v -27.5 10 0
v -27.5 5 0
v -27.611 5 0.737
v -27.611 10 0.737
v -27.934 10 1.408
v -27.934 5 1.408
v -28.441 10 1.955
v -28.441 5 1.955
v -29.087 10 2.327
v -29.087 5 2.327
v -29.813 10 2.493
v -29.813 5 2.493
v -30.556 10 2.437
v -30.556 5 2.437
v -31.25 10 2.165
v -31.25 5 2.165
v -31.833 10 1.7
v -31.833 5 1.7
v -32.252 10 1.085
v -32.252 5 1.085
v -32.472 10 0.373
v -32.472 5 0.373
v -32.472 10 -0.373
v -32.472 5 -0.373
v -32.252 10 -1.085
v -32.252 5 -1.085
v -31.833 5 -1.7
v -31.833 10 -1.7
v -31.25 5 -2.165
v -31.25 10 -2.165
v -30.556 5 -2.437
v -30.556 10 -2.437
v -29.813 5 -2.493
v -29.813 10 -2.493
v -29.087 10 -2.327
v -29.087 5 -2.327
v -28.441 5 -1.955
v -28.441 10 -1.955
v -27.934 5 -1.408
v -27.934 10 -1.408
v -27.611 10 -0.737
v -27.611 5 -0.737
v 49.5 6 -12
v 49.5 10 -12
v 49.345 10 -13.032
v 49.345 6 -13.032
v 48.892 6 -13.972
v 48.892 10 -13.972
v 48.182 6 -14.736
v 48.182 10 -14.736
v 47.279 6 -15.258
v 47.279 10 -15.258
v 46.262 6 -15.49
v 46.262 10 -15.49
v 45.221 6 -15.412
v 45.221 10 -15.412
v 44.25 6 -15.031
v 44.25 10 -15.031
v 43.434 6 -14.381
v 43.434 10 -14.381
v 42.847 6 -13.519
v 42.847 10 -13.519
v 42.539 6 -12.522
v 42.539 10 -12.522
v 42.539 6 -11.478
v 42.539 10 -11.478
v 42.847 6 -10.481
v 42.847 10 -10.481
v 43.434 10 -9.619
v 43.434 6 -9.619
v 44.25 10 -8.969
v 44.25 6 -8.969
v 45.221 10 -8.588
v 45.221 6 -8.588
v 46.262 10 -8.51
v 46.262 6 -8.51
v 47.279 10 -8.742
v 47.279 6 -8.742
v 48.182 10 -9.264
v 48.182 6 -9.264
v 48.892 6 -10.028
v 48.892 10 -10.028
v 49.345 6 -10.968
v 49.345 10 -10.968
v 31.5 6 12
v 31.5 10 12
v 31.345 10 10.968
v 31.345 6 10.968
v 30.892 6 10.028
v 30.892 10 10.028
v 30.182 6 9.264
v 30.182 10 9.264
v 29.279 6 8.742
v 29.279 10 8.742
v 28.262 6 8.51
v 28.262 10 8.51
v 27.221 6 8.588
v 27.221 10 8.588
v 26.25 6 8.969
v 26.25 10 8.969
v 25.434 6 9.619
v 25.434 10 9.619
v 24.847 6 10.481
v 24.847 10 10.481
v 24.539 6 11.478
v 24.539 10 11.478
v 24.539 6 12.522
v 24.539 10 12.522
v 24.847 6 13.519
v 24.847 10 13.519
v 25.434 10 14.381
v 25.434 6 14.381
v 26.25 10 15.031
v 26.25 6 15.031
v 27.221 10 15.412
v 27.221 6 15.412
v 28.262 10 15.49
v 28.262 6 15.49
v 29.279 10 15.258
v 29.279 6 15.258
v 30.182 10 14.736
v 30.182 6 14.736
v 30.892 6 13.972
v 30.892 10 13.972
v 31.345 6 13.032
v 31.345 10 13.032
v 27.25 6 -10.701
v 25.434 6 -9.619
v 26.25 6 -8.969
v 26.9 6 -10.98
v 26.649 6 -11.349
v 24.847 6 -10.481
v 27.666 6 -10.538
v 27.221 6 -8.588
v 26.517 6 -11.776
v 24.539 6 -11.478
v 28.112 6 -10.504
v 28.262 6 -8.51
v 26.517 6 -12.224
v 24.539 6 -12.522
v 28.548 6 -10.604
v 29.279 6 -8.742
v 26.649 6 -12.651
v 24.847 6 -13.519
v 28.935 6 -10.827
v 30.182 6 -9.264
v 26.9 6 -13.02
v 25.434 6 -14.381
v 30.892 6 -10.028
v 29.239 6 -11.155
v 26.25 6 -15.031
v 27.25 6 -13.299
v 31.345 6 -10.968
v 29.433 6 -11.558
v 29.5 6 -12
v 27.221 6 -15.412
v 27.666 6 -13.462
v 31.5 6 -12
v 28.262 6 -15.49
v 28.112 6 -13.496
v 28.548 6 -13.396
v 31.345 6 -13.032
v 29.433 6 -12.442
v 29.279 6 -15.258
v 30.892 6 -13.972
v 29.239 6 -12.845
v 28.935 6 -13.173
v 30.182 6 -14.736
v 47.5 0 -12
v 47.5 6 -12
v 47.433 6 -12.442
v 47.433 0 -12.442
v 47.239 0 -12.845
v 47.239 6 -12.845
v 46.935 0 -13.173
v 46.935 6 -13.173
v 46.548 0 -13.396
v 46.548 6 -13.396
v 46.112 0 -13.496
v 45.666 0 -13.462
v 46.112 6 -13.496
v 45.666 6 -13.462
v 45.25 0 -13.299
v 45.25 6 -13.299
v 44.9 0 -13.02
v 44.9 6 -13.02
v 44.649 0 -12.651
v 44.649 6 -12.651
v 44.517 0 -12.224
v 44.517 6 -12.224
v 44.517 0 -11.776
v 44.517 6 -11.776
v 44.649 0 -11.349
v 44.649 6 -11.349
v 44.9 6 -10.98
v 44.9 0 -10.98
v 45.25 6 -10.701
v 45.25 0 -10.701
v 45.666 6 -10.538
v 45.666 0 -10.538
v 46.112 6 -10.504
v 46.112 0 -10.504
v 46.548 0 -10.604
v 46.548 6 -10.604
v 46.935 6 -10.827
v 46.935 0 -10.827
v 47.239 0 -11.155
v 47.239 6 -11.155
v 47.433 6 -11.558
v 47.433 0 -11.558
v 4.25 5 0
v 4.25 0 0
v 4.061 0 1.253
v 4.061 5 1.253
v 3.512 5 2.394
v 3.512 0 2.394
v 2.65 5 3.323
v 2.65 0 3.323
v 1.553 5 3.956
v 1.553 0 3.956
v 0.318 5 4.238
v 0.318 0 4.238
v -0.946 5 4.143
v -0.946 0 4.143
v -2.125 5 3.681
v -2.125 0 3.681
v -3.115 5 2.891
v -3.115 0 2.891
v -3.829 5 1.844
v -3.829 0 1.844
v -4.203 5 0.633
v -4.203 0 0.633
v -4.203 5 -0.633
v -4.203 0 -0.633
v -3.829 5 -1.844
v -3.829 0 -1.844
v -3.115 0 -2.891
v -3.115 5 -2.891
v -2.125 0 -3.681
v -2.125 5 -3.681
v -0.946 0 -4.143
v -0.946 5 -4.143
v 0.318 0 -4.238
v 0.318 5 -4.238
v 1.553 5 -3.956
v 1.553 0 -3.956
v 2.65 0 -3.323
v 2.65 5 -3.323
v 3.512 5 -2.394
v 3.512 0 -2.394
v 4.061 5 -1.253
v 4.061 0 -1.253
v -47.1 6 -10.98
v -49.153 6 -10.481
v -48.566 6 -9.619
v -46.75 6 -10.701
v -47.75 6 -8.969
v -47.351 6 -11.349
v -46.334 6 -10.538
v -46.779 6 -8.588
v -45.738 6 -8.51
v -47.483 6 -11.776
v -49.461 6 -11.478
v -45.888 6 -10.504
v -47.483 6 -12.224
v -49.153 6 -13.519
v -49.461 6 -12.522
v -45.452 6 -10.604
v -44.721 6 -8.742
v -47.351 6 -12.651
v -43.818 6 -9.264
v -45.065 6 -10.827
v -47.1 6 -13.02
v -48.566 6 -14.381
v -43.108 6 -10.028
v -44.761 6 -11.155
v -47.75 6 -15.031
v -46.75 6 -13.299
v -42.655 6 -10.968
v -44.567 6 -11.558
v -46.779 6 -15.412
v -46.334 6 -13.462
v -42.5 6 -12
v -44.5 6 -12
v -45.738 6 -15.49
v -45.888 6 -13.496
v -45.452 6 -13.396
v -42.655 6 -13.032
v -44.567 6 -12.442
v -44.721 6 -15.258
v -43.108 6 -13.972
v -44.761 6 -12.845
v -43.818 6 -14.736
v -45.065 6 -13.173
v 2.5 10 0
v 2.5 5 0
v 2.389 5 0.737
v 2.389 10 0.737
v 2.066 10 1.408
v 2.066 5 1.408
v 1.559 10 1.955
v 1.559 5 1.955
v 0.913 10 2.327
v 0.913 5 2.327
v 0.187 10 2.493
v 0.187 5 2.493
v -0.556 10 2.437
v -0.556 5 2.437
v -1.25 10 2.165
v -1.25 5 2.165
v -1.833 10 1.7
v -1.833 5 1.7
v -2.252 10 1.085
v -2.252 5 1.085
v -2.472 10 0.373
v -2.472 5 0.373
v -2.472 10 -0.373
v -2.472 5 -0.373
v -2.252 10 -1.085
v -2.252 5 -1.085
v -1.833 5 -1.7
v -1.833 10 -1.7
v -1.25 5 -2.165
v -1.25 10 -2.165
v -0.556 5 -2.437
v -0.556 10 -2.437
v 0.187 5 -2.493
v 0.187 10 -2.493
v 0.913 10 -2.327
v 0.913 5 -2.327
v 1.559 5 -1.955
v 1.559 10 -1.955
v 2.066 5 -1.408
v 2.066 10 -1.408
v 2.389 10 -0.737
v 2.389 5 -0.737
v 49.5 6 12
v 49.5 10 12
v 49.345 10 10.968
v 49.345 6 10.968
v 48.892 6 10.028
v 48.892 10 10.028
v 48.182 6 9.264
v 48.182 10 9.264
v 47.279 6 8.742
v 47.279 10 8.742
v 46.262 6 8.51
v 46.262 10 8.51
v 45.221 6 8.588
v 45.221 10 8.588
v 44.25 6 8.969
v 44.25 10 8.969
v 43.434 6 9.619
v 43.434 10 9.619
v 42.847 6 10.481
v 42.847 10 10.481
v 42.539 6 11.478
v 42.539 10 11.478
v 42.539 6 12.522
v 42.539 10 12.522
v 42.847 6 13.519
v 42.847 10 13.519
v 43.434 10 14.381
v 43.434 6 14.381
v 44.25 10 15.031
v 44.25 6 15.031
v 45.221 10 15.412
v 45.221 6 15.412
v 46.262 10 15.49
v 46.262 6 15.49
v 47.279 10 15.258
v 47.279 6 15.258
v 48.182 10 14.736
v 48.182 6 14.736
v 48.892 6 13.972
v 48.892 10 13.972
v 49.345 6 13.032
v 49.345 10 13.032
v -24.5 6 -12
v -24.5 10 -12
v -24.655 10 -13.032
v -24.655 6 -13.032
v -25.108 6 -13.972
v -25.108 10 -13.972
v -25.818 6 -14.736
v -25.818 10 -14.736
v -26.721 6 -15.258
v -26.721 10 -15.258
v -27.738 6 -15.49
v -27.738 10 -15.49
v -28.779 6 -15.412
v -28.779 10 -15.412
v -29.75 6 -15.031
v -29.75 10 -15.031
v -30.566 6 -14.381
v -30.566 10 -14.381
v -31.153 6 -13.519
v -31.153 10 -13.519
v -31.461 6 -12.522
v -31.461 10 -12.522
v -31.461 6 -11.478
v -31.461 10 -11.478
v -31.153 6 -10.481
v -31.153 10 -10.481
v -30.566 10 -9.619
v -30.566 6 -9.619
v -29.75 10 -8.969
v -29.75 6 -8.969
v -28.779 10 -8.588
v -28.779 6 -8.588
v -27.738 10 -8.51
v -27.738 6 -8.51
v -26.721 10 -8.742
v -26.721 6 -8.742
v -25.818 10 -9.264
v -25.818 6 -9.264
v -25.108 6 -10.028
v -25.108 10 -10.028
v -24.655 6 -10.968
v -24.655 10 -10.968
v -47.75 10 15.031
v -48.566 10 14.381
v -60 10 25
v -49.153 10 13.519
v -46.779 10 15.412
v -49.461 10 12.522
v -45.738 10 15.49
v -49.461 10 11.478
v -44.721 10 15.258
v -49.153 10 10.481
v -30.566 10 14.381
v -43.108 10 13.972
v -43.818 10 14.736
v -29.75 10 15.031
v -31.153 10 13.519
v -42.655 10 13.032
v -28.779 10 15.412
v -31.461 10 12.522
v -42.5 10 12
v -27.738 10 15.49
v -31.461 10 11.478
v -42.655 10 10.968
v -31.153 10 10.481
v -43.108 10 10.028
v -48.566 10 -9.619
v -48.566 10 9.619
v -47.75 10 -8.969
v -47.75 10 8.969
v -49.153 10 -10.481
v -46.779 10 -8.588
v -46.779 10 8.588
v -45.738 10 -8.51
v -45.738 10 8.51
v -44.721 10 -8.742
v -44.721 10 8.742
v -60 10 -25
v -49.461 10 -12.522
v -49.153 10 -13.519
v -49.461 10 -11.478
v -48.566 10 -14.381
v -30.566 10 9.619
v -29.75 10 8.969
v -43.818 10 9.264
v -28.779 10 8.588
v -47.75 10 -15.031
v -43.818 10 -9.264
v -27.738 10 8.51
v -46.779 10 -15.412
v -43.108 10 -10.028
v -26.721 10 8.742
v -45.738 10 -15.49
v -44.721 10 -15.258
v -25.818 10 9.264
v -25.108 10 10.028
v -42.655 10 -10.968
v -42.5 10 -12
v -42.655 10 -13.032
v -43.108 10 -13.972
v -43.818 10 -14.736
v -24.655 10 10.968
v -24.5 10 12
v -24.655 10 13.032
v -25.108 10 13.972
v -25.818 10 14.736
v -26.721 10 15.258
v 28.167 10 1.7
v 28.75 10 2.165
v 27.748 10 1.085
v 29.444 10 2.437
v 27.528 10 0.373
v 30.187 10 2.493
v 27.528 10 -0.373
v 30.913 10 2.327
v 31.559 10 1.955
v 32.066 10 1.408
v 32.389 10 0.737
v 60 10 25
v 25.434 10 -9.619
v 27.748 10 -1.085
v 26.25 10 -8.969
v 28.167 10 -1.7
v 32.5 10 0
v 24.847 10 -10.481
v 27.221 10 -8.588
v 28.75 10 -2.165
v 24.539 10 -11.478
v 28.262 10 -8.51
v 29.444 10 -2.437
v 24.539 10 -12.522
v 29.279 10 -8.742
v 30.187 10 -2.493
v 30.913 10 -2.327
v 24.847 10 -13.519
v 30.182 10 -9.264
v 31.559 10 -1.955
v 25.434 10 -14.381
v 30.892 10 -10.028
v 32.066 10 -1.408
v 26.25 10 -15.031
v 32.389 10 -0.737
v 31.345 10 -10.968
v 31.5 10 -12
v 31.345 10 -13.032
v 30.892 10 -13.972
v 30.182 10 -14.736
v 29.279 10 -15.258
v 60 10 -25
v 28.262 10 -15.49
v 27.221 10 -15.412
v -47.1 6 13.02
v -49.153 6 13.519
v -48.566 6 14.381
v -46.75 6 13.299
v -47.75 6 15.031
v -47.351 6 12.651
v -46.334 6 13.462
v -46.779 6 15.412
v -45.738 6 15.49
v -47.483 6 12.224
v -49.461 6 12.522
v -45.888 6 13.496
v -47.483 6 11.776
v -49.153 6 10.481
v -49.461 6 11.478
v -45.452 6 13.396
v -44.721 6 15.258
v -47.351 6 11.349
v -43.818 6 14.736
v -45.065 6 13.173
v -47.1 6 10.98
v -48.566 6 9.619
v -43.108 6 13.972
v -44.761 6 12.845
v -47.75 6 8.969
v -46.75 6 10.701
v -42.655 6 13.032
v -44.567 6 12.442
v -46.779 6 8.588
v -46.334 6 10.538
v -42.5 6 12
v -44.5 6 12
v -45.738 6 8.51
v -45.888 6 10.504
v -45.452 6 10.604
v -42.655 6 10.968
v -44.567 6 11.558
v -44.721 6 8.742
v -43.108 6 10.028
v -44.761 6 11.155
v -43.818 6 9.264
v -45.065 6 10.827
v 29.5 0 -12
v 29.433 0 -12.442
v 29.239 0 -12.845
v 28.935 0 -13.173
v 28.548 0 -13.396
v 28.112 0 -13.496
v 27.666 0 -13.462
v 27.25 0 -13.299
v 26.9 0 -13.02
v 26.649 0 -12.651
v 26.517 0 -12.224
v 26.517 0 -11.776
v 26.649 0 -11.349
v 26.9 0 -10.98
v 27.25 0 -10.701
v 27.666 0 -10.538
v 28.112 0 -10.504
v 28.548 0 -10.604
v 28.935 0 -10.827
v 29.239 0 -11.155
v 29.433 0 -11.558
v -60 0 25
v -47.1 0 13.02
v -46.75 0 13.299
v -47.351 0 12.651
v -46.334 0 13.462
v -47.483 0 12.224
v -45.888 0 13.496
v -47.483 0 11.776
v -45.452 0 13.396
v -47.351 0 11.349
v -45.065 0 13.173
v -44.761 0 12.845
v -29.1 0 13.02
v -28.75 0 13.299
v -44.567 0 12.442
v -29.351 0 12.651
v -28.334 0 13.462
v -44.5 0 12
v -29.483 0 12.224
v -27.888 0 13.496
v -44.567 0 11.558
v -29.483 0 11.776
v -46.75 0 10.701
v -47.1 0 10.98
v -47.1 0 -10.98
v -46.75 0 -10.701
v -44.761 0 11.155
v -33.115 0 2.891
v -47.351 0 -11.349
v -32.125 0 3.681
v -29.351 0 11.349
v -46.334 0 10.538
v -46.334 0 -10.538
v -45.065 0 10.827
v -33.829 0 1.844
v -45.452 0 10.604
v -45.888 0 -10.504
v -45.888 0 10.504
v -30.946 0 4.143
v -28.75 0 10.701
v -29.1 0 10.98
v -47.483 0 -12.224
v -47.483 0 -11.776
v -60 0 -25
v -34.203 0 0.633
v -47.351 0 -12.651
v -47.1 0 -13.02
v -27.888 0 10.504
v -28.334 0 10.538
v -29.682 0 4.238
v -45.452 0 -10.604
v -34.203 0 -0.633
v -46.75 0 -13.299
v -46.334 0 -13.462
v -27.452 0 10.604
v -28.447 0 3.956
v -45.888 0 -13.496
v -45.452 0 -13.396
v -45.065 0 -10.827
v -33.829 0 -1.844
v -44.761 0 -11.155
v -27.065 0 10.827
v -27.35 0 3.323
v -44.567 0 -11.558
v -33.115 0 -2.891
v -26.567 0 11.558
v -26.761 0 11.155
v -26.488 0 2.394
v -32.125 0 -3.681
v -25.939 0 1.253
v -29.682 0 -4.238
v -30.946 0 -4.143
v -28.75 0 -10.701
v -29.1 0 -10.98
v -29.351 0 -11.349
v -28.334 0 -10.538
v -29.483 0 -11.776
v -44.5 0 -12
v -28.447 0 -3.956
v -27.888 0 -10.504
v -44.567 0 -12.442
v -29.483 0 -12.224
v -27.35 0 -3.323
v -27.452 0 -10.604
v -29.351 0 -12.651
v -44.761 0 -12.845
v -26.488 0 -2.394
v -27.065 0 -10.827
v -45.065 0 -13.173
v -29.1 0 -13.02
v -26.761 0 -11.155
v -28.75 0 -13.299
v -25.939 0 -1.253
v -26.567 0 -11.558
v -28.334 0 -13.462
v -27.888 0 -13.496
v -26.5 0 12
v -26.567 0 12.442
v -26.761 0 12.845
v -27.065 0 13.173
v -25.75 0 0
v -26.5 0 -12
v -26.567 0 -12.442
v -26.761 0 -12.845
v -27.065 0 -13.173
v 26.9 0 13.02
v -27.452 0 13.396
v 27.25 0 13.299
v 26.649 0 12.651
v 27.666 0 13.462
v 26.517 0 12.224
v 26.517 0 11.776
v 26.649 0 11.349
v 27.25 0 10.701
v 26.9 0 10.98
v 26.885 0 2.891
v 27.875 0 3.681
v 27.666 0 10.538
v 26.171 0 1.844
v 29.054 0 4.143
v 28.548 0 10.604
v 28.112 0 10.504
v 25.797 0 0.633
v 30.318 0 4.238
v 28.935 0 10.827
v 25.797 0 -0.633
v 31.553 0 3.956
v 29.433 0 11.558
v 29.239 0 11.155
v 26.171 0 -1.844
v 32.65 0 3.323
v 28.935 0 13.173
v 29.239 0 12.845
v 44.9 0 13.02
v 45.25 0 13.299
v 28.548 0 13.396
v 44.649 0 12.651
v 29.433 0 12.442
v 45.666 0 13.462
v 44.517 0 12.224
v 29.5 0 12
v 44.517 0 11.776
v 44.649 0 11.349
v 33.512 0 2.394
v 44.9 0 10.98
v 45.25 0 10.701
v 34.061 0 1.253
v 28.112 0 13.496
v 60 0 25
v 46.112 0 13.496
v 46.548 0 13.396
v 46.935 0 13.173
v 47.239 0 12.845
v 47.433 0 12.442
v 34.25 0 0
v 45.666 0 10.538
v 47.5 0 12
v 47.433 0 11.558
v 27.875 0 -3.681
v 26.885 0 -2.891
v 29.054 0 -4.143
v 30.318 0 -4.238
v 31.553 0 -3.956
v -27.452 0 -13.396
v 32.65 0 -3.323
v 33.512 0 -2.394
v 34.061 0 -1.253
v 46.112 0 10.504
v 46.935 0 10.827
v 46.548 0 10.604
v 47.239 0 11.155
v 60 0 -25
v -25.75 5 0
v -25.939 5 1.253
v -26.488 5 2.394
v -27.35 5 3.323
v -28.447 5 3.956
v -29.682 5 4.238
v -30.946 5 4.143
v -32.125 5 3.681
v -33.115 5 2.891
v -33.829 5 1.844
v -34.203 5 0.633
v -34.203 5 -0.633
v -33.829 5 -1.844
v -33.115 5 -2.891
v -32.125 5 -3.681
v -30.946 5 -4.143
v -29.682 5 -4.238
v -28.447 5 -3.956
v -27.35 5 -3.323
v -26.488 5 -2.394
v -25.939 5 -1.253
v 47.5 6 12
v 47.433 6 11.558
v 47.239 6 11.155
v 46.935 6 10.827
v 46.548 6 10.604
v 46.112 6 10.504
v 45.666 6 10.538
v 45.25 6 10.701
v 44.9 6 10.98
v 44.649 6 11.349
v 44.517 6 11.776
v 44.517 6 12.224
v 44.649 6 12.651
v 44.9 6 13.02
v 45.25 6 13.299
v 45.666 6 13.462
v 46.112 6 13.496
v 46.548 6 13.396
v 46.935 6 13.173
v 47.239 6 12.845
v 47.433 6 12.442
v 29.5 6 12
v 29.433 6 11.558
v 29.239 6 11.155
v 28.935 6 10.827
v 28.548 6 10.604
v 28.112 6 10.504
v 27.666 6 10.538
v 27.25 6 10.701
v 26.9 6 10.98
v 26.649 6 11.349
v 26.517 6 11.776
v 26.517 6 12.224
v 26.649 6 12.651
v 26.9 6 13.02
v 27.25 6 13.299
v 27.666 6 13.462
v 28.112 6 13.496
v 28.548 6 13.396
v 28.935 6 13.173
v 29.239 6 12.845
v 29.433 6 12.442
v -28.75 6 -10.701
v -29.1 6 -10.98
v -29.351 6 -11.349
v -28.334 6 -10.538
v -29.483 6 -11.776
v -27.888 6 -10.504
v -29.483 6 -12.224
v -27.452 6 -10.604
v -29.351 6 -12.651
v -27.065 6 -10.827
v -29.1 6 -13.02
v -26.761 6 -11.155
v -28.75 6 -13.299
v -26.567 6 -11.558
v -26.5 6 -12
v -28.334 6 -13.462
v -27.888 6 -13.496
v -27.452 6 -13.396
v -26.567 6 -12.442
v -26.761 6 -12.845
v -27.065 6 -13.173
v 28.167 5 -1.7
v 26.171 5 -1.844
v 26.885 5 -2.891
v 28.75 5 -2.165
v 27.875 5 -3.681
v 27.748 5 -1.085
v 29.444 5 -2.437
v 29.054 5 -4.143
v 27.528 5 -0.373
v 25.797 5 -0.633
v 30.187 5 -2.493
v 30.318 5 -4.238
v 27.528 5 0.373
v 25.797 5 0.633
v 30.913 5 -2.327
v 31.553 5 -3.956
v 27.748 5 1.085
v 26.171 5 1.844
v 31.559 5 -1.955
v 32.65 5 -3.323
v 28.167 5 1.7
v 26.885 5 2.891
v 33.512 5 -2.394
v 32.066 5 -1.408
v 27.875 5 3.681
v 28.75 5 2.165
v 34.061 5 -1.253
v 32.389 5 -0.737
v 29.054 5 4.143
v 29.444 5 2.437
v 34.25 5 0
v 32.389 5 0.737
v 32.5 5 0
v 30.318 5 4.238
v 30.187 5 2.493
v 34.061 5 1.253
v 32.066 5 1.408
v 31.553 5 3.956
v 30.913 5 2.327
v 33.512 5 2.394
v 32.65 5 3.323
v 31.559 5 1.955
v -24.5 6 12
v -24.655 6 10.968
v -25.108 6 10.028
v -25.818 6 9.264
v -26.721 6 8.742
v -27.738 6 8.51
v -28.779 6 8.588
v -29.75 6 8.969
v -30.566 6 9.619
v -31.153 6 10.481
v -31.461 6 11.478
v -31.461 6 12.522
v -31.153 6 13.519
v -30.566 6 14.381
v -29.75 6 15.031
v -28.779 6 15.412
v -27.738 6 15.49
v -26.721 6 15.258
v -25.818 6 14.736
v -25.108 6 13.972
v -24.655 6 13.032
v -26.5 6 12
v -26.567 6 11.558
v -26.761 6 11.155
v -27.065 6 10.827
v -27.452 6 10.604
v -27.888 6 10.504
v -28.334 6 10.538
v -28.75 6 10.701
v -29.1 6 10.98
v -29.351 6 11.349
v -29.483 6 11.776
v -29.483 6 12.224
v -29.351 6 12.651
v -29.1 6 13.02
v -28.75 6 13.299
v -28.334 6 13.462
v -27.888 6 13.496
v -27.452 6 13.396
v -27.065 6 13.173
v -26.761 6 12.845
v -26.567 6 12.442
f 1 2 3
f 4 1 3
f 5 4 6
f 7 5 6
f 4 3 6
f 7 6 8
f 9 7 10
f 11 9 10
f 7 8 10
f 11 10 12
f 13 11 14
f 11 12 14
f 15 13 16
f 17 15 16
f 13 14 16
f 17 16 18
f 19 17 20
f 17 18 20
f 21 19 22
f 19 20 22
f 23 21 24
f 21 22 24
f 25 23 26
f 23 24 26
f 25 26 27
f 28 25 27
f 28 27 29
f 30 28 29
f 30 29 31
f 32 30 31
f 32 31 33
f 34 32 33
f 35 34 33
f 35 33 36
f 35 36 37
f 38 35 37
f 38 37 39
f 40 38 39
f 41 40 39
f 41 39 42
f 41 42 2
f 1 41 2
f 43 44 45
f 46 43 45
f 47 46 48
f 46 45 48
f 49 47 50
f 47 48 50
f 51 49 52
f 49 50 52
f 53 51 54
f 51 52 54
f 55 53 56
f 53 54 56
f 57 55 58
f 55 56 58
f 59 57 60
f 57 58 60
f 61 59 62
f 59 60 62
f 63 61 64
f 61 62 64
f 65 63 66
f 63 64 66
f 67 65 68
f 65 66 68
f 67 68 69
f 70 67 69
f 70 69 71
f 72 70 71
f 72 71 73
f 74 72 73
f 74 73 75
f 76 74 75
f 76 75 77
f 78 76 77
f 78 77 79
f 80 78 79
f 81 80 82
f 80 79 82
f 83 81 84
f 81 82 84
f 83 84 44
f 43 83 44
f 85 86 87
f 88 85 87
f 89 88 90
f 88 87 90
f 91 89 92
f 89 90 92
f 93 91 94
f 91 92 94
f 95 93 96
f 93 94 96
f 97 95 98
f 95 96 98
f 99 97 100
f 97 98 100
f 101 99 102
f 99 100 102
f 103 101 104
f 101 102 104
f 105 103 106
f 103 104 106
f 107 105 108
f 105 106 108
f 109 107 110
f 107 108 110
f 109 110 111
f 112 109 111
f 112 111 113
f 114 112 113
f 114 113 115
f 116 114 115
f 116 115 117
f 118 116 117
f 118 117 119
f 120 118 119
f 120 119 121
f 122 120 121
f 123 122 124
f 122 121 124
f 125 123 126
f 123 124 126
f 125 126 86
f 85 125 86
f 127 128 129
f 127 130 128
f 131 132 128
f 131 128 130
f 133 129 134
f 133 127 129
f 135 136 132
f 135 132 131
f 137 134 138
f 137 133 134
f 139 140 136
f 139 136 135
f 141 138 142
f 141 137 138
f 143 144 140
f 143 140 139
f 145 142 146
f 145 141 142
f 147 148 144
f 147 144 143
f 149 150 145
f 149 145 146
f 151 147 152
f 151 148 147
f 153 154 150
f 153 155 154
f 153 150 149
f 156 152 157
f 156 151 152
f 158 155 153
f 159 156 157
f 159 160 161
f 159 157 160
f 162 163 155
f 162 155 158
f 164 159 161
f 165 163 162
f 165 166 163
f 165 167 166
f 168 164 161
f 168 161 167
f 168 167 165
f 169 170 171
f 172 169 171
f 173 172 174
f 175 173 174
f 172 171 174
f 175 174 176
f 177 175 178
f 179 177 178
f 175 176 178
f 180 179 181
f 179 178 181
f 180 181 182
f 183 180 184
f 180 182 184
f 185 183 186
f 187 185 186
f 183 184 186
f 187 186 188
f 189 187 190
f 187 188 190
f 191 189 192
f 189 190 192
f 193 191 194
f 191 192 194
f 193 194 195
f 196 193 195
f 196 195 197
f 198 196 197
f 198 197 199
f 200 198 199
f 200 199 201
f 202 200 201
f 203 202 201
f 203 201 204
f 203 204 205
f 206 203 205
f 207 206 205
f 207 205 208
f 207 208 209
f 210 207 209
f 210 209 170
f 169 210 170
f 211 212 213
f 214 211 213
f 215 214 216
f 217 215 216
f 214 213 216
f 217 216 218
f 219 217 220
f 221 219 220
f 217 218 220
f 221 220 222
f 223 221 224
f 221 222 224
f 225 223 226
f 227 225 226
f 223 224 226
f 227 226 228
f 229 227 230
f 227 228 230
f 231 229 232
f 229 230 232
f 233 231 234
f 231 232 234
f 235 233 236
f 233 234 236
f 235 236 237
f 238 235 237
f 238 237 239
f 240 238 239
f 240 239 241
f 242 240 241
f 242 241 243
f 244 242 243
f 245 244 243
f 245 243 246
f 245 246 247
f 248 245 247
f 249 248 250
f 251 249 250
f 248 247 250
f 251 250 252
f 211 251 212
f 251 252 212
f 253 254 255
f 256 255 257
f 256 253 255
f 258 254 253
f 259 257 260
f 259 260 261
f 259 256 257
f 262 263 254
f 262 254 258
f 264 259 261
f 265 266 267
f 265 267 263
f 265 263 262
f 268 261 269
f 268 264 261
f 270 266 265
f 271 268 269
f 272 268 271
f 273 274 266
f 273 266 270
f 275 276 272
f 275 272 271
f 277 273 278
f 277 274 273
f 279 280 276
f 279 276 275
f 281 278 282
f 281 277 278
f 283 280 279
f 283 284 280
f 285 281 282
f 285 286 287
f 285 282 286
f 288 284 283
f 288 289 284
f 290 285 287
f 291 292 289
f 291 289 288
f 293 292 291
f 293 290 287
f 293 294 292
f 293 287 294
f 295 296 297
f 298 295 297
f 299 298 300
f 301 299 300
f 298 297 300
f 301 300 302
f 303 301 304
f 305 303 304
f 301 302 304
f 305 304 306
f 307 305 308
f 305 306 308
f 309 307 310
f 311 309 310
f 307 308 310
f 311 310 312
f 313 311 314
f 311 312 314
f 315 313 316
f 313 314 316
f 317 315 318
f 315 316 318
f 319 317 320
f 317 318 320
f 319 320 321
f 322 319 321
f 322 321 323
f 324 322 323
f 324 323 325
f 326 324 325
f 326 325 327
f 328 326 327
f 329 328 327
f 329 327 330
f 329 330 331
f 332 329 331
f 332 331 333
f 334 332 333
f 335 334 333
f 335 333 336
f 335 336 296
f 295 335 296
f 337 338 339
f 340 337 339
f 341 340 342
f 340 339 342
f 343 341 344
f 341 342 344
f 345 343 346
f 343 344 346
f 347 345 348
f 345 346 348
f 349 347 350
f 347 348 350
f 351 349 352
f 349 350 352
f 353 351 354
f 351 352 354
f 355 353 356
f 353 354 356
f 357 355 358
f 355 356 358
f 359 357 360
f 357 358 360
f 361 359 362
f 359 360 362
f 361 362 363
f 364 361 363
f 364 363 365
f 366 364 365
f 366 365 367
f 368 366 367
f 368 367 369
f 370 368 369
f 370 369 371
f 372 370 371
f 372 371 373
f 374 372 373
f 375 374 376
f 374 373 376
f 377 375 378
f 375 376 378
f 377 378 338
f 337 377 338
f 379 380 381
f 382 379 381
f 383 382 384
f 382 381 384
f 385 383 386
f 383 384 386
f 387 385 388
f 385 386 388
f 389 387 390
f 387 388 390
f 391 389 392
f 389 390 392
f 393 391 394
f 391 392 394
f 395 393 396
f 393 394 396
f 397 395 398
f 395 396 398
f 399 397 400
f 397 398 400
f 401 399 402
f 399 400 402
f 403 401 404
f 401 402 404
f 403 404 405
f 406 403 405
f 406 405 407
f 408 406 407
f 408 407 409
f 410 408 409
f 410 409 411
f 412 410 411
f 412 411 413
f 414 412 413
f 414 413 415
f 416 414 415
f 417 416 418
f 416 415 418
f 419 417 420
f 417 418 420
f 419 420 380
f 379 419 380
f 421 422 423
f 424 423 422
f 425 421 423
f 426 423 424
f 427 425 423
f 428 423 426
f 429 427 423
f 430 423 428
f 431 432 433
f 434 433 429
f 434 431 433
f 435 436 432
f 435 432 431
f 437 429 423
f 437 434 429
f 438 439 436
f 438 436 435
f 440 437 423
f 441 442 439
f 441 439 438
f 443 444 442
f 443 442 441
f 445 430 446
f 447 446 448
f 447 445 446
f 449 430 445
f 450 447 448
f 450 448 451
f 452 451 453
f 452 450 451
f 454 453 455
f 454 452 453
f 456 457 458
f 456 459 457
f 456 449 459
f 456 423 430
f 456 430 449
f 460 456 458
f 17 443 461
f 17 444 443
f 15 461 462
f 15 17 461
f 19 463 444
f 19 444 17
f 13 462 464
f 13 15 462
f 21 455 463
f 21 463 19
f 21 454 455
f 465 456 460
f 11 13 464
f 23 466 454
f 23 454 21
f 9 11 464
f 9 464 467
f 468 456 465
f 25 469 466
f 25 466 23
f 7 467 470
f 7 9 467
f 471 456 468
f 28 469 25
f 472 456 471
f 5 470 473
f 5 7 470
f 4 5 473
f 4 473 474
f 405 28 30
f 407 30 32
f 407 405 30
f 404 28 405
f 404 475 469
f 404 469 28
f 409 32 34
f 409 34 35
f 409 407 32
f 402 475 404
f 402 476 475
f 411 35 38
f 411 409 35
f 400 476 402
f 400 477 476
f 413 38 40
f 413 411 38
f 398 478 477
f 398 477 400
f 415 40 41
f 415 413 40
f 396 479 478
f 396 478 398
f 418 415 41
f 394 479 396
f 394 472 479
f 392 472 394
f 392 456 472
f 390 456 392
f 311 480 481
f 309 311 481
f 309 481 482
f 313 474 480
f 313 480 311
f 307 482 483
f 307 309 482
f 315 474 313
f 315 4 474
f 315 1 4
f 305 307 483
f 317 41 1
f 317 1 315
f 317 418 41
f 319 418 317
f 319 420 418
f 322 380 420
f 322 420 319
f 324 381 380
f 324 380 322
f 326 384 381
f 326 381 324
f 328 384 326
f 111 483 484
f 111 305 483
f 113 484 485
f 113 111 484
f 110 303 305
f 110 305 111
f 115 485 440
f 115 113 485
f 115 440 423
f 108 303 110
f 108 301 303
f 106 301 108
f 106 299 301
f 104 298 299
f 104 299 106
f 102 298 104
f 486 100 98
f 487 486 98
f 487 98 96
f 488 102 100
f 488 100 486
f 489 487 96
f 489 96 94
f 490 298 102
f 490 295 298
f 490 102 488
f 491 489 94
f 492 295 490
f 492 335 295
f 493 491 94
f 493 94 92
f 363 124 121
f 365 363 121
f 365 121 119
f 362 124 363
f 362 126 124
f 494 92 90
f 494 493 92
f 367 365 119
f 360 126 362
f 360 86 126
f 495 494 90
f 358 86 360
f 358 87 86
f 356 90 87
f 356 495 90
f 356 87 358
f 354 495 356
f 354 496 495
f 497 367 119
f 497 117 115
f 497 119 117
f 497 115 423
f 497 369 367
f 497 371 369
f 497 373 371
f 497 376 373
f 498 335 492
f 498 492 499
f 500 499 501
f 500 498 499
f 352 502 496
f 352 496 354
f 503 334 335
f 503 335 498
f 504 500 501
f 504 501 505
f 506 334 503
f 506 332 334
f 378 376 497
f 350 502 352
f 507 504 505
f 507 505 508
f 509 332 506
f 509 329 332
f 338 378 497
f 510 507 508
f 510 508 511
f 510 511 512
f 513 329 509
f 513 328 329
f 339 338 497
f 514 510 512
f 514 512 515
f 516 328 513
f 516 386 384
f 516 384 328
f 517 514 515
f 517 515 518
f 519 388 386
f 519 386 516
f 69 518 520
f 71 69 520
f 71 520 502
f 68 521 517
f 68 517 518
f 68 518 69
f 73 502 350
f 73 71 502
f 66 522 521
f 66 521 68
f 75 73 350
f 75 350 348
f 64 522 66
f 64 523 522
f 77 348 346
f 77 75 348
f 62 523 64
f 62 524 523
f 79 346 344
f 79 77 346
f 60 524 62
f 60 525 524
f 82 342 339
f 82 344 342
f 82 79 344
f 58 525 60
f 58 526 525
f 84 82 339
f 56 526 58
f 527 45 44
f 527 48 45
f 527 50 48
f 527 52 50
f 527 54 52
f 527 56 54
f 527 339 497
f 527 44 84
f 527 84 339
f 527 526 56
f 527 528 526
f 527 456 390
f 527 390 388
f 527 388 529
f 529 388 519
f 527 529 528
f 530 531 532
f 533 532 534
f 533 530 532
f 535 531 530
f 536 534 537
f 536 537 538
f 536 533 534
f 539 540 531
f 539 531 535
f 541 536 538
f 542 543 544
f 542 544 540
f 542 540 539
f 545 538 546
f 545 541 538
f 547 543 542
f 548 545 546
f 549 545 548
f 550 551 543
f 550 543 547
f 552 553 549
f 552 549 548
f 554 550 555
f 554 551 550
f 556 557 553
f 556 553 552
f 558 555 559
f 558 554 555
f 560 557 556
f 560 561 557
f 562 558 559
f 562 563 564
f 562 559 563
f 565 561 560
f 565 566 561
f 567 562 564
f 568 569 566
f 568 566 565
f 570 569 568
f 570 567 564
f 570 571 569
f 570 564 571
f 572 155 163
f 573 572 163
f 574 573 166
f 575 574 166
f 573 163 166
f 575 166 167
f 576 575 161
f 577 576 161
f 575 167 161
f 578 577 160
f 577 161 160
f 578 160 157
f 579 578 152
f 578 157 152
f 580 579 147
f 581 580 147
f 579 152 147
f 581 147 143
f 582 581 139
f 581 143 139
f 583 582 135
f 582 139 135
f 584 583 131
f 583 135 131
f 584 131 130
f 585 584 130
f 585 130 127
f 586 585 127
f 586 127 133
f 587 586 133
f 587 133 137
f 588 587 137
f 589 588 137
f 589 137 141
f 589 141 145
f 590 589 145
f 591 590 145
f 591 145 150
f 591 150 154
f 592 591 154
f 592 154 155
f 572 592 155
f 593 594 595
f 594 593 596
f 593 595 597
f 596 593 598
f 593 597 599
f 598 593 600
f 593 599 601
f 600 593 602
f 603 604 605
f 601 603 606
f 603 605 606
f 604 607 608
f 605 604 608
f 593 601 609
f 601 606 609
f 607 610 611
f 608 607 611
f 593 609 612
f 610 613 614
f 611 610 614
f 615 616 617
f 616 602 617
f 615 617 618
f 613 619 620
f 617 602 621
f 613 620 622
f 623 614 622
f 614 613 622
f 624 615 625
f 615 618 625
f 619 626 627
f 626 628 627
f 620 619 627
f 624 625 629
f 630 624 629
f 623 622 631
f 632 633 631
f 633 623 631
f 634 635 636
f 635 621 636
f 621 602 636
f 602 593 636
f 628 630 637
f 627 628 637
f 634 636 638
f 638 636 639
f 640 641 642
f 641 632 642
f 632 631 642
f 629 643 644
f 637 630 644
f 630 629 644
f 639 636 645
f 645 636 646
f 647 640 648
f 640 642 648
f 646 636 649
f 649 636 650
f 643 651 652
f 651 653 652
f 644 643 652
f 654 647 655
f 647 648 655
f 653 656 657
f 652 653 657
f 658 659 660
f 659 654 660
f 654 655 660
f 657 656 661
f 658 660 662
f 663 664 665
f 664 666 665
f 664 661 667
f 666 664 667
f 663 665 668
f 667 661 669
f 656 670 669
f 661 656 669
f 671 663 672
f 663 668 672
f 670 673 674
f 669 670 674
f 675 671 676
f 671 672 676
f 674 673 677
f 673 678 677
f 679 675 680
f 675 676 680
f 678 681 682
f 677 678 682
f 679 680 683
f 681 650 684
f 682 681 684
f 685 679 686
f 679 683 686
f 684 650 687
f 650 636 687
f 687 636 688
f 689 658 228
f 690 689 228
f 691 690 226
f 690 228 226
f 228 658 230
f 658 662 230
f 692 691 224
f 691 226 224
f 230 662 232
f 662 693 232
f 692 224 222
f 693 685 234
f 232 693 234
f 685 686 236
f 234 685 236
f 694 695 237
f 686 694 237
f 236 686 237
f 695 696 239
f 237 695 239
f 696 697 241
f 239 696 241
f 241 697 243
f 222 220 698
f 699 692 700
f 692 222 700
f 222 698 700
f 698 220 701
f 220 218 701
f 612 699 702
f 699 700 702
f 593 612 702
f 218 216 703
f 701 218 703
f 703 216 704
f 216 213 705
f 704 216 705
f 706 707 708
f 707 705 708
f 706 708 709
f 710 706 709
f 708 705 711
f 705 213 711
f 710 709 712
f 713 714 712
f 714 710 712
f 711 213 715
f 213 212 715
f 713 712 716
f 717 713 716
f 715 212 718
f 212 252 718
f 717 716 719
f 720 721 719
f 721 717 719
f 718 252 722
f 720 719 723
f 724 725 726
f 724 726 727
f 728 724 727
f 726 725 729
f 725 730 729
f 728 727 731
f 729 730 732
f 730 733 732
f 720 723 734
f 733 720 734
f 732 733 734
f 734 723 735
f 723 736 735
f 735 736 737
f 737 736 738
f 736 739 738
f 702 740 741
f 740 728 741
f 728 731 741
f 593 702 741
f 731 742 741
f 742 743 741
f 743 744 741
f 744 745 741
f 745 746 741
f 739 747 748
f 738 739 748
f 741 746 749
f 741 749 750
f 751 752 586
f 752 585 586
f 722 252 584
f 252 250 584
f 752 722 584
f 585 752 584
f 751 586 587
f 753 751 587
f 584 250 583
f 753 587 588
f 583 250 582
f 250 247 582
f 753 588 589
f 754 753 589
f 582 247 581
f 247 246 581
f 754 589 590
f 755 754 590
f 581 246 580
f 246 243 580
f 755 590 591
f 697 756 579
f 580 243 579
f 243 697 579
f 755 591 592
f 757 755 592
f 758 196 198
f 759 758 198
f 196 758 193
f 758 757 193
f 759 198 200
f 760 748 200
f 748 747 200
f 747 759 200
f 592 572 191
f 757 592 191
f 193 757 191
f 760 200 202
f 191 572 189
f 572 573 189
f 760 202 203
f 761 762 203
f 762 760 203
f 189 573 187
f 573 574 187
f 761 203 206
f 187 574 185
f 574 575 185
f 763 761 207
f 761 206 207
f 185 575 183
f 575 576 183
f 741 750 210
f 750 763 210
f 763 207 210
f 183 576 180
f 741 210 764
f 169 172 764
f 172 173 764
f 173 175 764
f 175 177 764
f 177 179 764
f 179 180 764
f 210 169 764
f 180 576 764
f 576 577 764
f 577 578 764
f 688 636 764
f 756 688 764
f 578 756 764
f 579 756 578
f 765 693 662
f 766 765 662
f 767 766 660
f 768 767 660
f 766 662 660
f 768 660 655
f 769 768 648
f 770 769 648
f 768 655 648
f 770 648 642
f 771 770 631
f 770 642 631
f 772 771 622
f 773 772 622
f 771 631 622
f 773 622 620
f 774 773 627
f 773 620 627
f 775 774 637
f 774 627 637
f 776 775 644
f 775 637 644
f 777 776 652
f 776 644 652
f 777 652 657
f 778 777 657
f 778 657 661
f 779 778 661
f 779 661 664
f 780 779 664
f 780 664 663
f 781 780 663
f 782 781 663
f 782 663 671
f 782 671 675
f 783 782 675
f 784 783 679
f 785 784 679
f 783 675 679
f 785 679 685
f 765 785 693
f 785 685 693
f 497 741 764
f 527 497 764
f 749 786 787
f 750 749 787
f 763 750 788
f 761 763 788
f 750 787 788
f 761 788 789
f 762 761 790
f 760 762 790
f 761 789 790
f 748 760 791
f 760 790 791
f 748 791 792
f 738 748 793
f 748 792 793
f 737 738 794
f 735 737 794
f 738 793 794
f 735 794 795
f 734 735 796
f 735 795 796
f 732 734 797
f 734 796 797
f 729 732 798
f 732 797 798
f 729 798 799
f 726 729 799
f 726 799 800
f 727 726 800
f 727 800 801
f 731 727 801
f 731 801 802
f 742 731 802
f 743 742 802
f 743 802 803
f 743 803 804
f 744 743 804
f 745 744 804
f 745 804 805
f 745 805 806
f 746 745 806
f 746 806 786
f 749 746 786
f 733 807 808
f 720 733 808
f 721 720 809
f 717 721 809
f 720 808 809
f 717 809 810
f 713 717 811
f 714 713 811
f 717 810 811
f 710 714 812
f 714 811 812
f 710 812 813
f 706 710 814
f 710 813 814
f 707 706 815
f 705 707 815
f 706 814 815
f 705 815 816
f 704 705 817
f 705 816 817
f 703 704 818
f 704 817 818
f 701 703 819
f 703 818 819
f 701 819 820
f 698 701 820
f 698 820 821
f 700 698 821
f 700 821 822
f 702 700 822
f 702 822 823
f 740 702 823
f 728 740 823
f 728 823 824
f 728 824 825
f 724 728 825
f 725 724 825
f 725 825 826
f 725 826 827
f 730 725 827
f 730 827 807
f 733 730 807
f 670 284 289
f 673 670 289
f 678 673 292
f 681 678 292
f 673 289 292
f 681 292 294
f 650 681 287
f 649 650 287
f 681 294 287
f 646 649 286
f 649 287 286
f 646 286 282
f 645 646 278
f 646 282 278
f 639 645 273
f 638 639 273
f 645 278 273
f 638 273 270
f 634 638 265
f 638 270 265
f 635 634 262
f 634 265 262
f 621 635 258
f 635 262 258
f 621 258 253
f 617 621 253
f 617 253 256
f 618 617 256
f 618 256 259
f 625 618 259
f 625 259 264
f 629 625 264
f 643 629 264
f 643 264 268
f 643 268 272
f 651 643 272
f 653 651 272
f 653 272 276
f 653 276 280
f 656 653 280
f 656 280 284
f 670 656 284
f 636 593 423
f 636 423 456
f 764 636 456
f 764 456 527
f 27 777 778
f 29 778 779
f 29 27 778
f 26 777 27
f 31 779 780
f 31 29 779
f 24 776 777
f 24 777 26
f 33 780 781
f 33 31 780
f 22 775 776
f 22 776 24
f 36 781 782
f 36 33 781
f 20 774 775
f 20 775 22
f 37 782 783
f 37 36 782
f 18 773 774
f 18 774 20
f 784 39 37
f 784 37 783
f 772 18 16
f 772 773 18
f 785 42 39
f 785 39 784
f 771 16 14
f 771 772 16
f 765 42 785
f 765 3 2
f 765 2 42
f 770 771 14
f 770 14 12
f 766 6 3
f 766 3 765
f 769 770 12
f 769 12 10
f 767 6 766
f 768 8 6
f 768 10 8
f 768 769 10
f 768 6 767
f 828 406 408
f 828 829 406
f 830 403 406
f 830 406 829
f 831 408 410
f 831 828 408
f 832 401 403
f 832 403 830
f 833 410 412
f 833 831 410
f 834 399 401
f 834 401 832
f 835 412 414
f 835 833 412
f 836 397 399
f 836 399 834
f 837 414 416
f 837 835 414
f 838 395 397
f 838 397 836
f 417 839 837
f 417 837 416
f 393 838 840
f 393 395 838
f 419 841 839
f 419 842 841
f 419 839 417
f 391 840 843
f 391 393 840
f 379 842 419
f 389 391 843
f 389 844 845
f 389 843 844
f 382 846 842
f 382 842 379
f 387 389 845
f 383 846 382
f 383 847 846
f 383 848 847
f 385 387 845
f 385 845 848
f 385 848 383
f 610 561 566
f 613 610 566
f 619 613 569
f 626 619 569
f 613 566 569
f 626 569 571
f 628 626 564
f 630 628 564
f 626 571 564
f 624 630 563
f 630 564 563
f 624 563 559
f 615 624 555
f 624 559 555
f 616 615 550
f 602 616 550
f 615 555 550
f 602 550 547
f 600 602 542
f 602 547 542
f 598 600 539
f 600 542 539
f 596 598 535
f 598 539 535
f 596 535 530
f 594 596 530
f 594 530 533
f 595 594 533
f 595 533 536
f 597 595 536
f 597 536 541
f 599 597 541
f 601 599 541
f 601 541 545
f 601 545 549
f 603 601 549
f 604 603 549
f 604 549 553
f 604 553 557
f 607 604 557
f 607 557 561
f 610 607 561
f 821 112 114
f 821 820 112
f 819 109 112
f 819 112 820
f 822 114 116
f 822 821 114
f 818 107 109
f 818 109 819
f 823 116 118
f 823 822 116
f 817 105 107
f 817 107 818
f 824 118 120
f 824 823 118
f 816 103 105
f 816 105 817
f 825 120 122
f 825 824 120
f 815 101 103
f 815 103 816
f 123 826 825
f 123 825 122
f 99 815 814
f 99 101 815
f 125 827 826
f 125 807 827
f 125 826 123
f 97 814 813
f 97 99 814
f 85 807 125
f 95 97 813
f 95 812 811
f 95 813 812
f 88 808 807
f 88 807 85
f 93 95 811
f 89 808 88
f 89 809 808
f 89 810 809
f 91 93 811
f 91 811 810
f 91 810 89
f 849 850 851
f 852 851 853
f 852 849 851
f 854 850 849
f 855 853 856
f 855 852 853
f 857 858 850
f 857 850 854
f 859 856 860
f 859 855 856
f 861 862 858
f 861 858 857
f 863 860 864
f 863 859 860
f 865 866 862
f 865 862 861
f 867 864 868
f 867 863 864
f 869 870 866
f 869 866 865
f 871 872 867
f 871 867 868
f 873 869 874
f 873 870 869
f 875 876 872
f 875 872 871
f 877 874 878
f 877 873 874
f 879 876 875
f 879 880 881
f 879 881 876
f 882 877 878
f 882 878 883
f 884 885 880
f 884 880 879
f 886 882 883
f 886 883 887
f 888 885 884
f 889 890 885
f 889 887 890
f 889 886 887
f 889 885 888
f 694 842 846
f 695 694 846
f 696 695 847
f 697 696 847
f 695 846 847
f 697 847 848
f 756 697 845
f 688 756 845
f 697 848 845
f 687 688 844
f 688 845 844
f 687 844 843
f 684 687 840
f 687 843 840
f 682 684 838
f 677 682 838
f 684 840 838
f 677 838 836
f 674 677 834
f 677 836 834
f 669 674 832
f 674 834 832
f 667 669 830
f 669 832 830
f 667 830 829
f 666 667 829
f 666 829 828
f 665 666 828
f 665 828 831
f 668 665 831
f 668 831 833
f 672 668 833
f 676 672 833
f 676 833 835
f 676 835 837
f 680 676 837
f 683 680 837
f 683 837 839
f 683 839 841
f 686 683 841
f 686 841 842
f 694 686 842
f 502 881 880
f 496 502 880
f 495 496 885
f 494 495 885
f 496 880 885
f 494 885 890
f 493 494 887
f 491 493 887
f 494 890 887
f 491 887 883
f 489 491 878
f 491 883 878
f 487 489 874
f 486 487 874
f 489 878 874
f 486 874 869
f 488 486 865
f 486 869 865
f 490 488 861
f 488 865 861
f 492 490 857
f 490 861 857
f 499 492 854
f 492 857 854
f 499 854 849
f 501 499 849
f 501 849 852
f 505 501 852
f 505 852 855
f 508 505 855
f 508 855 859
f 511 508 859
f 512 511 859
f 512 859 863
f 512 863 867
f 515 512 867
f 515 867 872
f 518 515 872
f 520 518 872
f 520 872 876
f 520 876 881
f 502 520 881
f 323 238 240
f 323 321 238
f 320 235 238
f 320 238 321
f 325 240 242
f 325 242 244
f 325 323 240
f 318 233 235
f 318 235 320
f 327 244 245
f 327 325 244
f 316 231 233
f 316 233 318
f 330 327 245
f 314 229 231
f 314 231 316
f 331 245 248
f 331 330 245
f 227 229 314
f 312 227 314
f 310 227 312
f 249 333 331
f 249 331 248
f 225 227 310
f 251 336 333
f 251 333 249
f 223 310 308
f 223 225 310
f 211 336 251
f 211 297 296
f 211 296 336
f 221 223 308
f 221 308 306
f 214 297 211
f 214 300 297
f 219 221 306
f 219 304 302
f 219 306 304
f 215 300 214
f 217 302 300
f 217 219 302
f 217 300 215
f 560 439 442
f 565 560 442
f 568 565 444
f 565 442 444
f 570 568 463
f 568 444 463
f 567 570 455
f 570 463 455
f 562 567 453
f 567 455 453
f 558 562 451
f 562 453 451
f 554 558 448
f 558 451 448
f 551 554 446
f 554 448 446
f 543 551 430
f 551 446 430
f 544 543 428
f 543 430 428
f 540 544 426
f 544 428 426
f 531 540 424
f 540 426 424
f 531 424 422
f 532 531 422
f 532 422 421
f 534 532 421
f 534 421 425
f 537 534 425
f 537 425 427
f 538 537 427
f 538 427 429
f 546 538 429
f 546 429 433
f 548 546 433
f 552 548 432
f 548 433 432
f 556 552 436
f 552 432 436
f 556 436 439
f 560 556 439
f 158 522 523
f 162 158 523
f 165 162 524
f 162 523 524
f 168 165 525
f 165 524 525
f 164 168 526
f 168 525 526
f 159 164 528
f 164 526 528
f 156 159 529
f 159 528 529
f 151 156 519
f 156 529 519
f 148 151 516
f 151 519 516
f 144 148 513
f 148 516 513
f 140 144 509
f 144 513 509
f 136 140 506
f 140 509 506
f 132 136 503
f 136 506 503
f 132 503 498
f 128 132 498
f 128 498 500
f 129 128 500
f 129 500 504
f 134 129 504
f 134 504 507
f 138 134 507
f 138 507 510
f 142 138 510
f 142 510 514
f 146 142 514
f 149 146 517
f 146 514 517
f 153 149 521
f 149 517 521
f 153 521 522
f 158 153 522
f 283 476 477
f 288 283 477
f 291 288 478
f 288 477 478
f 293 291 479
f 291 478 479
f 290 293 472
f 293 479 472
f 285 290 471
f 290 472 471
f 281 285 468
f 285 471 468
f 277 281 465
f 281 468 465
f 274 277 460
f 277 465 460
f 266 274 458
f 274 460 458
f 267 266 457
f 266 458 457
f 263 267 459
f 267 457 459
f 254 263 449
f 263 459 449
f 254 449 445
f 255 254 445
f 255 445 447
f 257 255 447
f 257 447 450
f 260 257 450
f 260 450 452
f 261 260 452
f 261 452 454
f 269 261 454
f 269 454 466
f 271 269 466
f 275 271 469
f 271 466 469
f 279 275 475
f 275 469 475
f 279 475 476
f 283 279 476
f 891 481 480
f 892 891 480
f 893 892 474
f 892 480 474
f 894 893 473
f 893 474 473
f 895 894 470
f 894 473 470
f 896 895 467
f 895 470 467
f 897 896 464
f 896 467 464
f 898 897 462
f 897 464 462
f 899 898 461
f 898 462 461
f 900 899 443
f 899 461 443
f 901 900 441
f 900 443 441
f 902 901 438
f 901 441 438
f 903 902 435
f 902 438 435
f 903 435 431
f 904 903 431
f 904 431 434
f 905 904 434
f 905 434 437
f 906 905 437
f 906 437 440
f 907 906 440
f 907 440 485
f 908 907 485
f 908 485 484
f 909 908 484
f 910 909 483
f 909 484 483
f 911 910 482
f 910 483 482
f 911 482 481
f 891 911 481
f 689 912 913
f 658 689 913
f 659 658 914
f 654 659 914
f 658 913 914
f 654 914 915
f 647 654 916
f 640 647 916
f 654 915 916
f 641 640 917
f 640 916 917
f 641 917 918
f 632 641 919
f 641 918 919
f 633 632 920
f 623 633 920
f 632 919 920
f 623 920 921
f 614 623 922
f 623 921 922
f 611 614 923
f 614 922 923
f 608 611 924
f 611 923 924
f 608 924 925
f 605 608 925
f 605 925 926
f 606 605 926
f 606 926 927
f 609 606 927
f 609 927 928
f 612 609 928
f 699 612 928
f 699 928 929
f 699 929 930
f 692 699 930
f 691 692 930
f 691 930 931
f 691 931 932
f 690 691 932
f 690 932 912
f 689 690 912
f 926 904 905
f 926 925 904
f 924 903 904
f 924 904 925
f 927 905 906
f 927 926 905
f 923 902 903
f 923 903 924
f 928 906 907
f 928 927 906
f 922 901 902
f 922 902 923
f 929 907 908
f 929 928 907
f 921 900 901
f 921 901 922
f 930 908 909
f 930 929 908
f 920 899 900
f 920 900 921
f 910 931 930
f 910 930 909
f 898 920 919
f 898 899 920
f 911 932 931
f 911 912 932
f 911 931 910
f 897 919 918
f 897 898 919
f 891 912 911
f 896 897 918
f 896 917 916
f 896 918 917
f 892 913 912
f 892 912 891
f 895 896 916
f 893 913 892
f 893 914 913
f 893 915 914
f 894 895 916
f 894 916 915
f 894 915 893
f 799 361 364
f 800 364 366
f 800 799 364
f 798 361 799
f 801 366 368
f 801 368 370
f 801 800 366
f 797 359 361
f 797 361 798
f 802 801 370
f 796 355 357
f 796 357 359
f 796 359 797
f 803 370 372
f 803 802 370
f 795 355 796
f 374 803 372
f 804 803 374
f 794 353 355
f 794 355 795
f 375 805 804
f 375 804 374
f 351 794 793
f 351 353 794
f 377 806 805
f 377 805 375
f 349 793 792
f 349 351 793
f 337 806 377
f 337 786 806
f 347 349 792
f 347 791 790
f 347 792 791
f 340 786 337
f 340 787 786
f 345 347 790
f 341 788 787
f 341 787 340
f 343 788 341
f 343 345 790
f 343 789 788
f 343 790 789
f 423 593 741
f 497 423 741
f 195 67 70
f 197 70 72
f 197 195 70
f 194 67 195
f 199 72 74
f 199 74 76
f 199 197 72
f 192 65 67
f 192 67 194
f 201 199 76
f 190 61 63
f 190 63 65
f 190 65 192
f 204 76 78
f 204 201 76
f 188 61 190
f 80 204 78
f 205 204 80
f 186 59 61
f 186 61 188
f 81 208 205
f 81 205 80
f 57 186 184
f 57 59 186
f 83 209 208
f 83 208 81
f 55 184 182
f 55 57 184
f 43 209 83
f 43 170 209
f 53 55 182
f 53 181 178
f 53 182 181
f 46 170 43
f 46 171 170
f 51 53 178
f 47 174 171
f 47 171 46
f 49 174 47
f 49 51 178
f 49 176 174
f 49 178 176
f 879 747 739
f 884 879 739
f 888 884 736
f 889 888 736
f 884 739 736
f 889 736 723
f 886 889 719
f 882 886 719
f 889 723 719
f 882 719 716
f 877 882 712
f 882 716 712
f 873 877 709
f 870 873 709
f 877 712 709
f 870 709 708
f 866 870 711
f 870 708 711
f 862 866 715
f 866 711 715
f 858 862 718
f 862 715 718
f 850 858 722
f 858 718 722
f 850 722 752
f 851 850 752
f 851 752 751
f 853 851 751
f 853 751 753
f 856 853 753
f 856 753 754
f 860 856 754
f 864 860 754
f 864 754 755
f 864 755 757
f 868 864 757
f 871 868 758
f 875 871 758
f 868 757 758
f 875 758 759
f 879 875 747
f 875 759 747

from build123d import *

# Parameters (mm, degrees)
SKETCH1_W                         = 120
SKETCH1_H                         = 50
BOSS_EXTRUDE1_DEPTH               = 10
SKETCH2_R                         = 1.5
LINEAR_BEARING_MOUNT_DEPTH        = 11
SKETCH3_R                         = 2.5
SURFACE_PROFILE_MOUNT_DEPTH       = 11
SKETCH4_R                         = 4.25
SURF_PROF_MOUNT_COUNTERSINK_DEPTH = 5
SKETCH5_R                         = 3.5
CUT_EXTRUDE1_DEPTH                = 4


with BuildPart() as part:
    # Sketch1 → Boss-Extrude1 (new body)
    with BuildSketch(Plane(origin=(0, 0, 0), x_dir=(1, 0, 0), z_dir=(0, 1, 0))):
        Rectangle(SKETCH1_W, SKETCH1_H)
    extrude(amount=BOSS_EXTRUDE1_DEPTH)

    # Sketch2 → Linear_bearing_mount (cut, through all)
    with BuildSketch(Plane(origin=(0, 10, 0), x_dir=(1, 0, 0), z_dir=(0, 1, 0))):
        with Locations((-28, -12)):
            Circle(SKETCH2_R)
        with Locations((-46, -12)):
            Circle(SKETCH2_R)
        with Locations((28, -12)):
            Circle(SKETCH2_R)
        with Locations((46, -12)):
            Circle(SKETCH2_R)
        with Locations((46, 12)):
            Circle(SKETCH2_R)
        with Locations((28, 12)):
            Circle(SKETCH2_R)
        with Locations((-46, 12)):
            Circle(SKETCH2_R)
        with Locations((-28, 12)):
            Circle(SKETCH2_R)
    extrude(amount=-LINEAR_BEARING_MOUNT_DEPTH, mode=Mode.SUBTRACT)

    # Sketch3 → Surface_profile_mount (cut, through all)
    with BuildSketch(Plane.XZ):
        Circle(SKETCH3_R)
        with Locations((30, 0)):
            Circle(SKETCH3_R)
        with Locations((-30, 0)):
            Circle(SKETCH3_R)
    extrude(amount=-SURFACE_PROFILE_MOUNT_DEPTH, mode=Mode.SUBTRACT)

    # Sketch4 → Surf.prof.mount_countersink (cut)
    with BuildSketch(Plane.XZ):
        with Locations((30, 0)):
            Circle(SKETCH4_R)
        Circle(SKETCH4_R)
        with Locations((-30, 0)):
            Circle(SKETCH4_R)
    extrude(amount=-SURF_PROF_MOUNT_COUNTERSINK_DEPTH, mode=Mode.SUBTRACT)

    # Sketch5 → Cut-Extrude1 (cut)
    with BuildSketch(Plane(origin=(0, 10, 0), x_dir=(1, 0, 0), z_dir=(0, 1, 0))):
        with Locations((-46, 12)):
            Circle(SKETCH5_R)
        with Locations((-28, 12)):
            Circle(SKETCH5_R)
        with Locations((-28, -12)):
            Circle(SKETCH5_R)
        with Locations((-46, -12)):
            Circle(SKETCH5_R)
        with Locations((46, -12)):
            Circle(SKETCH5_R)
        with Locations((28, -12)):
            Circle(SKETCH5_R)
        with Locations((28, 12)):
            Circle(SKETCH5_R)
        with Locations((46, 12)):
            Circle(SKETCH5_R)
    extrude(amount=-CUT_EXTRUDE1_DEPTH, mode=Mode.SUBTRACT)


solid = part.part
